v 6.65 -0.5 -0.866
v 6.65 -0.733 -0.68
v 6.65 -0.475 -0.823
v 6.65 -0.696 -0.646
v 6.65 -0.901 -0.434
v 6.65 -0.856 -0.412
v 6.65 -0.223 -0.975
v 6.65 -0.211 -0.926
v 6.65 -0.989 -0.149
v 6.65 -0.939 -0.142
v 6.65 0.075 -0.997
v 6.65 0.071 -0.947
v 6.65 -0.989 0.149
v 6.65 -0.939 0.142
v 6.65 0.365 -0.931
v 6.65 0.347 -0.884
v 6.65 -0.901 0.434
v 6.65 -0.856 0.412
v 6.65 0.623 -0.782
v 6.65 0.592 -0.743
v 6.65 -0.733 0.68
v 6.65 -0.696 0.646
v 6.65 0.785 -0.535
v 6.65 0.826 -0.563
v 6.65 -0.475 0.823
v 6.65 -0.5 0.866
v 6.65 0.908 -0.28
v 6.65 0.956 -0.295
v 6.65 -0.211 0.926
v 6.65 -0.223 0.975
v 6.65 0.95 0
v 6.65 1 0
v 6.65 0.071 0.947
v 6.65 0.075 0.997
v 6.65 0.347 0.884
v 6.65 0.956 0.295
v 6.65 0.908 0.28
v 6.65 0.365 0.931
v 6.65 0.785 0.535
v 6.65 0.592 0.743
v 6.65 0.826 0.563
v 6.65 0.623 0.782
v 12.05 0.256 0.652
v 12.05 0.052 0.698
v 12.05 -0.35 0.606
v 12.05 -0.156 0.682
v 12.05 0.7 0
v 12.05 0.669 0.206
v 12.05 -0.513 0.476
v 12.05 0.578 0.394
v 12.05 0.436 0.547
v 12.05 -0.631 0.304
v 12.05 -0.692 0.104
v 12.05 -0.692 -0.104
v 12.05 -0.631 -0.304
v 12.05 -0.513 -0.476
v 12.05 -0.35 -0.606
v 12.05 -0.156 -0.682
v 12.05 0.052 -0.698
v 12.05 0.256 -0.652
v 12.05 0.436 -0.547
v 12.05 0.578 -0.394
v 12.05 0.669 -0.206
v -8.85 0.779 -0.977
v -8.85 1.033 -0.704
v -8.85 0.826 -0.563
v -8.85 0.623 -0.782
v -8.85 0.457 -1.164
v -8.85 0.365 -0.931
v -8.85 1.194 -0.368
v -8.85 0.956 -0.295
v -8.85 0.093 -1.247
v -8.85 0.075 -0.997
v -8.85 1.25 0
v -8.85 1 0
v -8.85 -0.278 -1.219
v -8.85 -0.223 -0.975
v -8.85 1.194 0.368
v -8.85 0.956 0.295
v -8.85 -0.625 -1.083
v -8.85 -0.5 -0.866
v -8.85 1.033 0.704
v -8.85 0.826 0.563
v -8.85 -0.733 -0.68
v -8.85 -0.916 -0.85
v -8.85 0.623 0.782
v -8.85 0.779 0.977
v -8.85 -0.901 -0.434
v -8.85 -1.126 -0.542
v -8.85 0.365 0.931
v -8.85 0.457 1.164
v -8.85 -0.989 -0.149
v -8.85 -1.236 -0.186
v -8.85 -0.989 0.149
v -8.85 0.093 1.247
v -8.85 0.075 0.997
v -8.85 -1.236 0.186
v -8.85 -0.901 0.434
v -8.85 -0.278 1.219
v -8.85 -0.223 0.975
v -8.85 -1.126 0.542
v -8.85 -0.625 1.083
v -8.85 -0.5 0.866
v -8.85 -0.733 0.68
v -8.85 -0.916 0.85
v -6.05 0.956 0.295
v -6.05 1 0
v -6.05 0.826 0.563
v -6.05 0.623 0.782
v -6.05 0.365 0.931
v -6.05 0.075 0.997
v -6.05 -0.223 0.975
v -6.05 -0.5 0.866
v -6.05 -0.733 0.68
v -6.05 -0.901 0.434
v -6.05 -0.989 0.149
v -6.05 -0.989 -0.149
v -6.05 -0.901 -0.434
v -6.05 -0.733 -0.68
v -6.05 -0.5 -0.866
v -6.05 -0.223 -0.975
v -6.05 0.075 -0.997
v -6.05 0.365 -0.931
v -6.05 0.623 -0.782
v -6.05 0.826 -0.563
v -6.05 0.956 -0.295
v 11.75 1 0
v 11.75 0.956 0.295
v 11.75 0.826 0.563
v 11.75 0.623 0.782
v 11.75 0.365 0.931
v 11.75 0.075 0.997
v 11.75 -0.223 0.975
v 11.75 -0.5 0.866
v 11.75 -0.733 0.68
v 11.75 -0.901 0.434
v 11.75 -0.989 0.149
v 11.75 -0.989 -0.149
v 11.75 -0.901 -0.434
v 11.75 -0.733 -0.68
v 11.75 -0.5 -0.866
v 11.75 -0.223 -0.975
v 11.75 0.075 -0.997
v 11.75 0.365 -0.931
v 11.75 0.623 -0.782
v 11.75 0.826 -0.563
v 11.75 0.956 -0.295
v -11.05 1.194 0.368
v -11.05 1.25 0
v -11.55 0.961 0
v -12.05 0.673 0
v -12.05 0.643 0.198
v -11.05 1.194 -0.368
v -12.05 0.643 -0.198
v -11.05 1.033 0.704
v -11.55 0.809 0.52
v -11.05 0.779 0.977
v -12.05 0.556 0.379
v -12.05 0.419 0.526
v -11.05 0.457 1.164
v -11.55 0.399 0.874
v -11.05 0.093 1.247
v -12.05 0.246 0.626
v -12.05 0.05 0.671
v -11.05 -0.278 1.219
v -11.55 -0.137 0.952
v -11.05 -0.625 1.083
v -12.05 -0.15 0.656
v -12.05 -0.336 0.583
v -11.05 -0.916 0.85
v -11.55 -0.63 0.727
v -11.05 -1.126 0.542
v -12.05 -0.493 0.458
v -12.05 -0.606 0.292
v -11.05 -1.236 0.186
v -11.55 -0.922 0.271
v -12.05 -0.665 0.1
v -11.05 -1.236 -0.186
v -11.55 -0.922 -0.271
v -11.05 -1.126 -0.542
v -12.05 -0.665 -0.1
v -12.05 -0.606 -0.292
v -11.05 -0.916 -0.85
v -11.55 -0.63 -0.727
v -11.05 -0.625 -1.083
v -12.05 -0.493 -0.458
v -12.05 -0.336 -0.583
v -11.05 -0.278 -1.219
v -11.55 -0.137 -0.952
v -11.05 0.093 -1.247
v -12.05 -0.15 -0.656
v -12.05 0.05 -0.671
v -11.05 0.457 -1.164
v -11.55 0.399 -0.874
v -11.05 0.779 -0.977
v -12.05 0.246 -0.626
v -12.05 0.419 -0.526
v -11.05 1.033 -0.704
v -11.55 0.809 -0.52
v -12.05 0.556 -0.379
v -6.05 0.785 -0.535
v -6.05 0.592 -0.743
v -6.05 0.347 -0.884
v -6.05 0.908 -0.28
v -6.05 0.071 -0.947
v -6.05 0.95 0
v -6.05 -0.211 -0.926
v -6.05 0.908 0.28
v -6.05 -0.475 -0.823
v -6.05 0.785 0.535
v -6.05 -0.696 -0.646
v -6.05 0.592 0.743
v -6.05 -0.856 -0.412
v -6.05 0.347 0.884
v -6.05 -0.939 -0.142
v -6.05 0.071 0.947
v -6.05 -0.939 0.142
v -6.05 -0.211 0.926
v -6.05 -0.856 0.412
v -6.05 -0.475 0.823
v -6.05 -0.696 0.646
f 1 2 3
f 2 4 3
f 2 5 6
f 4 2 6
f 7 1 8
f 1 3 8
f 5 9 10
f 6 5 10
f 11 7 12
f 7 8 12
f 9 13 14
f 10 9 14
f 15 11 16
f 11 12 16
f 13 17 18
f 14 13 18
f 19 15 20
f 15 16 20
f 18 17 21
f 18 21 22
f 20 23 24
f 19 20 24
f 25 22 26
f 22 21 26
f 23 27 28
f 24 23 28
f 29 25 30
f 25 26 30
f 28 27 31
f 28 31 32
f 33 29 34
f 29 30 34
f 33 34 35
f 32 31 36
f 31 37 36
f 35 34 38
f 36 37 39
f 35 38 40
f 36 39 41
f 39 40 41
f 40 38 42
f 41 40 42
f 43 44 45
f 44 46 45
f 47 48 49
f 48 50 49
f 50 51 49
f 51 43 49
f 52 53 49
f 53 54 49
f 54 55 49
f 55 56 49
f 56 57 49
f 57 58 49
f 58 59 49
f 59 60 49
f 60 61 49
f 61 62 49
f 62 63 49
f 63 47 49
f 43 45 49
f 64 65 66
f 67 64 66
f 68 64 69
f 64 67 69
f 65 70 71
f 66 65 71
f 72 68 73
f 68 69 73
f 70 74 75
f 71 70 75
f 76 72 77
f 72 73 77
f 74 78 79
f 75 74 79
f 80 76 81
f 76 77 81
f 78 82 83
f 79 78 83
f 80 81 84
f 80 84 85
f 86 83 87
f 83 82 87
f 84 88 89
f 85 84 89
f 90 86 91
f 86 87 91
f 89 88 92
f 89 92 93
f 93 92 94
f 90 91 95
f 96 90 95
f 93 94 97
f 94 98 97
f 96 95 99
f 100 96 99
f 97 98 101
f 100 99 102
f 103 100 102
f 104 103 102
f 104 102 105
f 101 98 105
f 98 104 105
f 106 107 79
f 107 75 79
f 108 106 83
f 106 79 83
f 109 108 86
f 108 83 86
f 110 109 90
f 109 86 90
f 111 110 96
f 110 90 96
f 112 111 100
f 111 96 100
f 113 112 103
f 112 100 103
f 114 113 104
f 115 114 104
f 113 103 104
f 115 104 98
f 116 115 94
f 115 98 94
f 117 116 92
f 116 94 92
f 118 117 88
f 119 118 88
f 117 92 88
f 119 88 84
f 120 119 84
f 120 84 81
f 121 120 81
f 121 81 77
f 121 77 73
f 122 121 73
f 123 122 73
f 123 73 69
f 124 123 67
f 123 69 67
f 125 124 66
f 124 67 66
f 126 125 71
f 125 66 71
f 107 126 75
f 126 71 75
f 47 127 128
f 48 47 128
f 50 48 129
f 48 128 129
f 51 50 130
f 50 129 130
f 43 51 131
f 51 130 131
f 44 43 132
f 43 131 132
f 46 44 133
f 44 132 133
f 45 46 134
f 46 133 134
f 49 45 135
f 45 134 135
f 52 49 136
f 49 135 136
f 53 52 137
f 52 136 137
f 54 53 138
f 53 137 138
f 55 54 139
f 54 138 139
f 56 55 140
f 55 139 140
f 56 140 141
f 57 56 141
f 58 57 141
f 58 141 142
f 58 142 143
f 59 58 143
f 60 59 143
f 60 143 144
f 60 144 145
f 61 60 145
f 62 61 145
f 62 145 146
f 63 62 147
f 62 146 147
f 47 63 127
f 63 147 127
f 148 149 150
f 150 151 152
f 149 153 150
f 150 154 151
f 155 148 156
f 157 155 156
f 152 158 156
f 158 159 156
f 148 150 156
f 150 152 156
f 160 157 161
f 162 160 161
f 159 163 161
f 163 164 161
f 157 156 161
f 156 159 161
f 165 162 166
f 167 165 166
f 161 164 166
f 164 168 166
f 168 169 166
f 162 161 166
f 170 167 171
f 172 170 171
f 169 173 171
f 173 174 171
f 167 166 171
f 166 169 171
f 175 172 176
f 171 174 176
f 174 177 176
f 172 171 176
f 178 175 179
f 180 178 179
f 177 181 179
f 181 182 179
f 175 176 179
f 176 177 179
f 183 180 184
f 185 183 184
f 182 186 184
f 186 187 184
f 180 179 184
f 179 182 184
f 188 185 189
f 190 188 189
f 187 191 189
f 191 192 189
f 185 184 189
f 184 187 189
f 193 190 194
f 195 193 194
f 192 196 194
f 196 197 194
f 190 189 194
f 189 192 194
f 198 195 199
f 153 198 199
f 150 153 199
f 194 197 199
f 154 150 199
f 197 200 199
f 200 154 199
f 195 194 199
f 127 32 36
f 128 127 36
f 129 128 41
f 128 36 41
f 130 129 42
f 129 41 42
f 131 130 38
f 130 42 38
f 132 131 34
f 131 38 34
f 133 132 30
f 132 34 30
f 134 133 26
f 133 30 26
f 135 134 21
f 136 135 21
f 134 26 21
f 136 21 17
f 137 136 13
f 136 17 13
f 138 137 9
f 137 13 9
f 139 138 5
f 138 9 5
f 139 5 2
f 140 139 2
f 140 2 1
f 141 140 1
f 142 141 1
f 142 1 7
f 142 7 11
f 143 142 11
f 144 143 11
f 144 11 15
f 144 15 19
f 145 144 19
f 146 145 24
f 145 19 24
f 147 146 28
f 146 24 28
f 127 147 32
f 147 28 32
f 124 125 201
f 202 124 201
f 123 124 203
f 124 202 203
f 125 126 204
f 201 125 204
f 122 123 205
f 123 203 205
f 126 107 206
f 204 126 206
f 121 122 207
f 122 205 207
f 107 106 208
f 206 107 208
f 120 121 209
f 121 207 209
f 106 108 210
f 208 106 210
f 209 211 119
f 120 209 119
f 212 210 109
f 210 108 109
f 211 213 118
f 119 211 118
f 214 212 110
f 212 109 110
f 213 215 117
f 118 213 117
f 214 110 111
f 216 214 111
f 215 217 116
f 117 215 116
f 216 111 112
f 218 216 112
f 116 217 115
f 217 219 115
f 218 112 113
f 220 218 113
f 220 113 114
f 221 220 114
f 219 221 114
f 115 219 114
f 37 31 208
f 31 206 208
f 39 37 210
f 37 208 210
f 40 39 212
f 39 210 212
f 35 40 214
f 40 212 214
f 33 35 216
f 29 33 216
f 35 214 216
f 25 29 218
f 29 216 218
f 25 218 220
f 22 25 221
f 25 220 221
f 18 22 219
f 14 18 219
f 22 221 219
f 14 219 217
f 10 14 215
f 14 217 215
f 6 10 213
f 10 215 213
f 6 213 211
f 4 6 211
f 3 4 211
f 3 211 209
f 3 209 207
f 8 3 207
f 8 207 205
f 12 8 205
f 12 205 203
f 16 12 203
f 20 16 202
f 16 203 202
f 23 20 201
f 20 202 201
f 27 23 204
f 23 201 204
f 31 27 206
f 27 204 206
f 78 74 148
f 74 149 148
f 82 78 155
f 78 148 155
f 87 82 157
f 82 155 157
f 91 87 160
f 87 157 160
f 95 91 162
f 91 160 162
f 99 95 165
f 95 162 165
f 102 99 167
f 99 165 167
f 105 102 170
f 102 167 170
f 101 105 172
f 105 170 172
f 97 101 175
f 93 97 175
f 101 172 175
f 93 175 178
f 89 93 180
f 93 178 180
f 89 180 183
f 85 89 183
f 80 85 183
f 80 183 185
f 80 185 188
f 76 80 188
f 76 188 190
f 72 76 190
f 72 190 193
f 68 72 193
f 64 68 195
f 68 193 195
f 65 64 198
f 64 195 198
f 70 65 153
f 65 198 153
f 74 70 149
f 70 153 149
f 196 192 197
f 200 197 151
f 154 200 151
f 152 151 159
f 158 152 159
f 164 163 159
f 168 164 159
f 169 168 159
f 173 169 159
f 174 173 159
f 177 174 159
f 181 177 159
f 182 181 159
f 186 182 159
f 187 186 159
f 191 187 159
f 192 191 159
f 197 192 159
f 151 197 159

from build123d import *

# Parameters (mm, degrees)
CHANFREIN1_SIZE = 0.3


with BuildPart() as part:
    # Esquisse1 → Révolution1 (revolve)
    with BuildSketch(Plane.XY):
        Polygon((12.05, 0), (12.05, 1), (6.65, 1), (6.65, 0.95), (-6.05, 0.95), (-6.05, 1), (-8.85, 1), (-8.85, 1.25), (-11.05, 1.25), (-12.05, 0.672649731), (-12.05, 0), align=None)
    revolve(axis=Axis((-12.05, 0, 0), (1, 0, 0)))

    # Chanfrein1
    chanfrein1_edges = [part.edges().sort_by_distance(p)[0] for p in [
        (12.05, -1, 0),
    ]]
    chamfer(chanfrein1_edges, length=CHANFREIN1_SIZE)


solid = part.part
